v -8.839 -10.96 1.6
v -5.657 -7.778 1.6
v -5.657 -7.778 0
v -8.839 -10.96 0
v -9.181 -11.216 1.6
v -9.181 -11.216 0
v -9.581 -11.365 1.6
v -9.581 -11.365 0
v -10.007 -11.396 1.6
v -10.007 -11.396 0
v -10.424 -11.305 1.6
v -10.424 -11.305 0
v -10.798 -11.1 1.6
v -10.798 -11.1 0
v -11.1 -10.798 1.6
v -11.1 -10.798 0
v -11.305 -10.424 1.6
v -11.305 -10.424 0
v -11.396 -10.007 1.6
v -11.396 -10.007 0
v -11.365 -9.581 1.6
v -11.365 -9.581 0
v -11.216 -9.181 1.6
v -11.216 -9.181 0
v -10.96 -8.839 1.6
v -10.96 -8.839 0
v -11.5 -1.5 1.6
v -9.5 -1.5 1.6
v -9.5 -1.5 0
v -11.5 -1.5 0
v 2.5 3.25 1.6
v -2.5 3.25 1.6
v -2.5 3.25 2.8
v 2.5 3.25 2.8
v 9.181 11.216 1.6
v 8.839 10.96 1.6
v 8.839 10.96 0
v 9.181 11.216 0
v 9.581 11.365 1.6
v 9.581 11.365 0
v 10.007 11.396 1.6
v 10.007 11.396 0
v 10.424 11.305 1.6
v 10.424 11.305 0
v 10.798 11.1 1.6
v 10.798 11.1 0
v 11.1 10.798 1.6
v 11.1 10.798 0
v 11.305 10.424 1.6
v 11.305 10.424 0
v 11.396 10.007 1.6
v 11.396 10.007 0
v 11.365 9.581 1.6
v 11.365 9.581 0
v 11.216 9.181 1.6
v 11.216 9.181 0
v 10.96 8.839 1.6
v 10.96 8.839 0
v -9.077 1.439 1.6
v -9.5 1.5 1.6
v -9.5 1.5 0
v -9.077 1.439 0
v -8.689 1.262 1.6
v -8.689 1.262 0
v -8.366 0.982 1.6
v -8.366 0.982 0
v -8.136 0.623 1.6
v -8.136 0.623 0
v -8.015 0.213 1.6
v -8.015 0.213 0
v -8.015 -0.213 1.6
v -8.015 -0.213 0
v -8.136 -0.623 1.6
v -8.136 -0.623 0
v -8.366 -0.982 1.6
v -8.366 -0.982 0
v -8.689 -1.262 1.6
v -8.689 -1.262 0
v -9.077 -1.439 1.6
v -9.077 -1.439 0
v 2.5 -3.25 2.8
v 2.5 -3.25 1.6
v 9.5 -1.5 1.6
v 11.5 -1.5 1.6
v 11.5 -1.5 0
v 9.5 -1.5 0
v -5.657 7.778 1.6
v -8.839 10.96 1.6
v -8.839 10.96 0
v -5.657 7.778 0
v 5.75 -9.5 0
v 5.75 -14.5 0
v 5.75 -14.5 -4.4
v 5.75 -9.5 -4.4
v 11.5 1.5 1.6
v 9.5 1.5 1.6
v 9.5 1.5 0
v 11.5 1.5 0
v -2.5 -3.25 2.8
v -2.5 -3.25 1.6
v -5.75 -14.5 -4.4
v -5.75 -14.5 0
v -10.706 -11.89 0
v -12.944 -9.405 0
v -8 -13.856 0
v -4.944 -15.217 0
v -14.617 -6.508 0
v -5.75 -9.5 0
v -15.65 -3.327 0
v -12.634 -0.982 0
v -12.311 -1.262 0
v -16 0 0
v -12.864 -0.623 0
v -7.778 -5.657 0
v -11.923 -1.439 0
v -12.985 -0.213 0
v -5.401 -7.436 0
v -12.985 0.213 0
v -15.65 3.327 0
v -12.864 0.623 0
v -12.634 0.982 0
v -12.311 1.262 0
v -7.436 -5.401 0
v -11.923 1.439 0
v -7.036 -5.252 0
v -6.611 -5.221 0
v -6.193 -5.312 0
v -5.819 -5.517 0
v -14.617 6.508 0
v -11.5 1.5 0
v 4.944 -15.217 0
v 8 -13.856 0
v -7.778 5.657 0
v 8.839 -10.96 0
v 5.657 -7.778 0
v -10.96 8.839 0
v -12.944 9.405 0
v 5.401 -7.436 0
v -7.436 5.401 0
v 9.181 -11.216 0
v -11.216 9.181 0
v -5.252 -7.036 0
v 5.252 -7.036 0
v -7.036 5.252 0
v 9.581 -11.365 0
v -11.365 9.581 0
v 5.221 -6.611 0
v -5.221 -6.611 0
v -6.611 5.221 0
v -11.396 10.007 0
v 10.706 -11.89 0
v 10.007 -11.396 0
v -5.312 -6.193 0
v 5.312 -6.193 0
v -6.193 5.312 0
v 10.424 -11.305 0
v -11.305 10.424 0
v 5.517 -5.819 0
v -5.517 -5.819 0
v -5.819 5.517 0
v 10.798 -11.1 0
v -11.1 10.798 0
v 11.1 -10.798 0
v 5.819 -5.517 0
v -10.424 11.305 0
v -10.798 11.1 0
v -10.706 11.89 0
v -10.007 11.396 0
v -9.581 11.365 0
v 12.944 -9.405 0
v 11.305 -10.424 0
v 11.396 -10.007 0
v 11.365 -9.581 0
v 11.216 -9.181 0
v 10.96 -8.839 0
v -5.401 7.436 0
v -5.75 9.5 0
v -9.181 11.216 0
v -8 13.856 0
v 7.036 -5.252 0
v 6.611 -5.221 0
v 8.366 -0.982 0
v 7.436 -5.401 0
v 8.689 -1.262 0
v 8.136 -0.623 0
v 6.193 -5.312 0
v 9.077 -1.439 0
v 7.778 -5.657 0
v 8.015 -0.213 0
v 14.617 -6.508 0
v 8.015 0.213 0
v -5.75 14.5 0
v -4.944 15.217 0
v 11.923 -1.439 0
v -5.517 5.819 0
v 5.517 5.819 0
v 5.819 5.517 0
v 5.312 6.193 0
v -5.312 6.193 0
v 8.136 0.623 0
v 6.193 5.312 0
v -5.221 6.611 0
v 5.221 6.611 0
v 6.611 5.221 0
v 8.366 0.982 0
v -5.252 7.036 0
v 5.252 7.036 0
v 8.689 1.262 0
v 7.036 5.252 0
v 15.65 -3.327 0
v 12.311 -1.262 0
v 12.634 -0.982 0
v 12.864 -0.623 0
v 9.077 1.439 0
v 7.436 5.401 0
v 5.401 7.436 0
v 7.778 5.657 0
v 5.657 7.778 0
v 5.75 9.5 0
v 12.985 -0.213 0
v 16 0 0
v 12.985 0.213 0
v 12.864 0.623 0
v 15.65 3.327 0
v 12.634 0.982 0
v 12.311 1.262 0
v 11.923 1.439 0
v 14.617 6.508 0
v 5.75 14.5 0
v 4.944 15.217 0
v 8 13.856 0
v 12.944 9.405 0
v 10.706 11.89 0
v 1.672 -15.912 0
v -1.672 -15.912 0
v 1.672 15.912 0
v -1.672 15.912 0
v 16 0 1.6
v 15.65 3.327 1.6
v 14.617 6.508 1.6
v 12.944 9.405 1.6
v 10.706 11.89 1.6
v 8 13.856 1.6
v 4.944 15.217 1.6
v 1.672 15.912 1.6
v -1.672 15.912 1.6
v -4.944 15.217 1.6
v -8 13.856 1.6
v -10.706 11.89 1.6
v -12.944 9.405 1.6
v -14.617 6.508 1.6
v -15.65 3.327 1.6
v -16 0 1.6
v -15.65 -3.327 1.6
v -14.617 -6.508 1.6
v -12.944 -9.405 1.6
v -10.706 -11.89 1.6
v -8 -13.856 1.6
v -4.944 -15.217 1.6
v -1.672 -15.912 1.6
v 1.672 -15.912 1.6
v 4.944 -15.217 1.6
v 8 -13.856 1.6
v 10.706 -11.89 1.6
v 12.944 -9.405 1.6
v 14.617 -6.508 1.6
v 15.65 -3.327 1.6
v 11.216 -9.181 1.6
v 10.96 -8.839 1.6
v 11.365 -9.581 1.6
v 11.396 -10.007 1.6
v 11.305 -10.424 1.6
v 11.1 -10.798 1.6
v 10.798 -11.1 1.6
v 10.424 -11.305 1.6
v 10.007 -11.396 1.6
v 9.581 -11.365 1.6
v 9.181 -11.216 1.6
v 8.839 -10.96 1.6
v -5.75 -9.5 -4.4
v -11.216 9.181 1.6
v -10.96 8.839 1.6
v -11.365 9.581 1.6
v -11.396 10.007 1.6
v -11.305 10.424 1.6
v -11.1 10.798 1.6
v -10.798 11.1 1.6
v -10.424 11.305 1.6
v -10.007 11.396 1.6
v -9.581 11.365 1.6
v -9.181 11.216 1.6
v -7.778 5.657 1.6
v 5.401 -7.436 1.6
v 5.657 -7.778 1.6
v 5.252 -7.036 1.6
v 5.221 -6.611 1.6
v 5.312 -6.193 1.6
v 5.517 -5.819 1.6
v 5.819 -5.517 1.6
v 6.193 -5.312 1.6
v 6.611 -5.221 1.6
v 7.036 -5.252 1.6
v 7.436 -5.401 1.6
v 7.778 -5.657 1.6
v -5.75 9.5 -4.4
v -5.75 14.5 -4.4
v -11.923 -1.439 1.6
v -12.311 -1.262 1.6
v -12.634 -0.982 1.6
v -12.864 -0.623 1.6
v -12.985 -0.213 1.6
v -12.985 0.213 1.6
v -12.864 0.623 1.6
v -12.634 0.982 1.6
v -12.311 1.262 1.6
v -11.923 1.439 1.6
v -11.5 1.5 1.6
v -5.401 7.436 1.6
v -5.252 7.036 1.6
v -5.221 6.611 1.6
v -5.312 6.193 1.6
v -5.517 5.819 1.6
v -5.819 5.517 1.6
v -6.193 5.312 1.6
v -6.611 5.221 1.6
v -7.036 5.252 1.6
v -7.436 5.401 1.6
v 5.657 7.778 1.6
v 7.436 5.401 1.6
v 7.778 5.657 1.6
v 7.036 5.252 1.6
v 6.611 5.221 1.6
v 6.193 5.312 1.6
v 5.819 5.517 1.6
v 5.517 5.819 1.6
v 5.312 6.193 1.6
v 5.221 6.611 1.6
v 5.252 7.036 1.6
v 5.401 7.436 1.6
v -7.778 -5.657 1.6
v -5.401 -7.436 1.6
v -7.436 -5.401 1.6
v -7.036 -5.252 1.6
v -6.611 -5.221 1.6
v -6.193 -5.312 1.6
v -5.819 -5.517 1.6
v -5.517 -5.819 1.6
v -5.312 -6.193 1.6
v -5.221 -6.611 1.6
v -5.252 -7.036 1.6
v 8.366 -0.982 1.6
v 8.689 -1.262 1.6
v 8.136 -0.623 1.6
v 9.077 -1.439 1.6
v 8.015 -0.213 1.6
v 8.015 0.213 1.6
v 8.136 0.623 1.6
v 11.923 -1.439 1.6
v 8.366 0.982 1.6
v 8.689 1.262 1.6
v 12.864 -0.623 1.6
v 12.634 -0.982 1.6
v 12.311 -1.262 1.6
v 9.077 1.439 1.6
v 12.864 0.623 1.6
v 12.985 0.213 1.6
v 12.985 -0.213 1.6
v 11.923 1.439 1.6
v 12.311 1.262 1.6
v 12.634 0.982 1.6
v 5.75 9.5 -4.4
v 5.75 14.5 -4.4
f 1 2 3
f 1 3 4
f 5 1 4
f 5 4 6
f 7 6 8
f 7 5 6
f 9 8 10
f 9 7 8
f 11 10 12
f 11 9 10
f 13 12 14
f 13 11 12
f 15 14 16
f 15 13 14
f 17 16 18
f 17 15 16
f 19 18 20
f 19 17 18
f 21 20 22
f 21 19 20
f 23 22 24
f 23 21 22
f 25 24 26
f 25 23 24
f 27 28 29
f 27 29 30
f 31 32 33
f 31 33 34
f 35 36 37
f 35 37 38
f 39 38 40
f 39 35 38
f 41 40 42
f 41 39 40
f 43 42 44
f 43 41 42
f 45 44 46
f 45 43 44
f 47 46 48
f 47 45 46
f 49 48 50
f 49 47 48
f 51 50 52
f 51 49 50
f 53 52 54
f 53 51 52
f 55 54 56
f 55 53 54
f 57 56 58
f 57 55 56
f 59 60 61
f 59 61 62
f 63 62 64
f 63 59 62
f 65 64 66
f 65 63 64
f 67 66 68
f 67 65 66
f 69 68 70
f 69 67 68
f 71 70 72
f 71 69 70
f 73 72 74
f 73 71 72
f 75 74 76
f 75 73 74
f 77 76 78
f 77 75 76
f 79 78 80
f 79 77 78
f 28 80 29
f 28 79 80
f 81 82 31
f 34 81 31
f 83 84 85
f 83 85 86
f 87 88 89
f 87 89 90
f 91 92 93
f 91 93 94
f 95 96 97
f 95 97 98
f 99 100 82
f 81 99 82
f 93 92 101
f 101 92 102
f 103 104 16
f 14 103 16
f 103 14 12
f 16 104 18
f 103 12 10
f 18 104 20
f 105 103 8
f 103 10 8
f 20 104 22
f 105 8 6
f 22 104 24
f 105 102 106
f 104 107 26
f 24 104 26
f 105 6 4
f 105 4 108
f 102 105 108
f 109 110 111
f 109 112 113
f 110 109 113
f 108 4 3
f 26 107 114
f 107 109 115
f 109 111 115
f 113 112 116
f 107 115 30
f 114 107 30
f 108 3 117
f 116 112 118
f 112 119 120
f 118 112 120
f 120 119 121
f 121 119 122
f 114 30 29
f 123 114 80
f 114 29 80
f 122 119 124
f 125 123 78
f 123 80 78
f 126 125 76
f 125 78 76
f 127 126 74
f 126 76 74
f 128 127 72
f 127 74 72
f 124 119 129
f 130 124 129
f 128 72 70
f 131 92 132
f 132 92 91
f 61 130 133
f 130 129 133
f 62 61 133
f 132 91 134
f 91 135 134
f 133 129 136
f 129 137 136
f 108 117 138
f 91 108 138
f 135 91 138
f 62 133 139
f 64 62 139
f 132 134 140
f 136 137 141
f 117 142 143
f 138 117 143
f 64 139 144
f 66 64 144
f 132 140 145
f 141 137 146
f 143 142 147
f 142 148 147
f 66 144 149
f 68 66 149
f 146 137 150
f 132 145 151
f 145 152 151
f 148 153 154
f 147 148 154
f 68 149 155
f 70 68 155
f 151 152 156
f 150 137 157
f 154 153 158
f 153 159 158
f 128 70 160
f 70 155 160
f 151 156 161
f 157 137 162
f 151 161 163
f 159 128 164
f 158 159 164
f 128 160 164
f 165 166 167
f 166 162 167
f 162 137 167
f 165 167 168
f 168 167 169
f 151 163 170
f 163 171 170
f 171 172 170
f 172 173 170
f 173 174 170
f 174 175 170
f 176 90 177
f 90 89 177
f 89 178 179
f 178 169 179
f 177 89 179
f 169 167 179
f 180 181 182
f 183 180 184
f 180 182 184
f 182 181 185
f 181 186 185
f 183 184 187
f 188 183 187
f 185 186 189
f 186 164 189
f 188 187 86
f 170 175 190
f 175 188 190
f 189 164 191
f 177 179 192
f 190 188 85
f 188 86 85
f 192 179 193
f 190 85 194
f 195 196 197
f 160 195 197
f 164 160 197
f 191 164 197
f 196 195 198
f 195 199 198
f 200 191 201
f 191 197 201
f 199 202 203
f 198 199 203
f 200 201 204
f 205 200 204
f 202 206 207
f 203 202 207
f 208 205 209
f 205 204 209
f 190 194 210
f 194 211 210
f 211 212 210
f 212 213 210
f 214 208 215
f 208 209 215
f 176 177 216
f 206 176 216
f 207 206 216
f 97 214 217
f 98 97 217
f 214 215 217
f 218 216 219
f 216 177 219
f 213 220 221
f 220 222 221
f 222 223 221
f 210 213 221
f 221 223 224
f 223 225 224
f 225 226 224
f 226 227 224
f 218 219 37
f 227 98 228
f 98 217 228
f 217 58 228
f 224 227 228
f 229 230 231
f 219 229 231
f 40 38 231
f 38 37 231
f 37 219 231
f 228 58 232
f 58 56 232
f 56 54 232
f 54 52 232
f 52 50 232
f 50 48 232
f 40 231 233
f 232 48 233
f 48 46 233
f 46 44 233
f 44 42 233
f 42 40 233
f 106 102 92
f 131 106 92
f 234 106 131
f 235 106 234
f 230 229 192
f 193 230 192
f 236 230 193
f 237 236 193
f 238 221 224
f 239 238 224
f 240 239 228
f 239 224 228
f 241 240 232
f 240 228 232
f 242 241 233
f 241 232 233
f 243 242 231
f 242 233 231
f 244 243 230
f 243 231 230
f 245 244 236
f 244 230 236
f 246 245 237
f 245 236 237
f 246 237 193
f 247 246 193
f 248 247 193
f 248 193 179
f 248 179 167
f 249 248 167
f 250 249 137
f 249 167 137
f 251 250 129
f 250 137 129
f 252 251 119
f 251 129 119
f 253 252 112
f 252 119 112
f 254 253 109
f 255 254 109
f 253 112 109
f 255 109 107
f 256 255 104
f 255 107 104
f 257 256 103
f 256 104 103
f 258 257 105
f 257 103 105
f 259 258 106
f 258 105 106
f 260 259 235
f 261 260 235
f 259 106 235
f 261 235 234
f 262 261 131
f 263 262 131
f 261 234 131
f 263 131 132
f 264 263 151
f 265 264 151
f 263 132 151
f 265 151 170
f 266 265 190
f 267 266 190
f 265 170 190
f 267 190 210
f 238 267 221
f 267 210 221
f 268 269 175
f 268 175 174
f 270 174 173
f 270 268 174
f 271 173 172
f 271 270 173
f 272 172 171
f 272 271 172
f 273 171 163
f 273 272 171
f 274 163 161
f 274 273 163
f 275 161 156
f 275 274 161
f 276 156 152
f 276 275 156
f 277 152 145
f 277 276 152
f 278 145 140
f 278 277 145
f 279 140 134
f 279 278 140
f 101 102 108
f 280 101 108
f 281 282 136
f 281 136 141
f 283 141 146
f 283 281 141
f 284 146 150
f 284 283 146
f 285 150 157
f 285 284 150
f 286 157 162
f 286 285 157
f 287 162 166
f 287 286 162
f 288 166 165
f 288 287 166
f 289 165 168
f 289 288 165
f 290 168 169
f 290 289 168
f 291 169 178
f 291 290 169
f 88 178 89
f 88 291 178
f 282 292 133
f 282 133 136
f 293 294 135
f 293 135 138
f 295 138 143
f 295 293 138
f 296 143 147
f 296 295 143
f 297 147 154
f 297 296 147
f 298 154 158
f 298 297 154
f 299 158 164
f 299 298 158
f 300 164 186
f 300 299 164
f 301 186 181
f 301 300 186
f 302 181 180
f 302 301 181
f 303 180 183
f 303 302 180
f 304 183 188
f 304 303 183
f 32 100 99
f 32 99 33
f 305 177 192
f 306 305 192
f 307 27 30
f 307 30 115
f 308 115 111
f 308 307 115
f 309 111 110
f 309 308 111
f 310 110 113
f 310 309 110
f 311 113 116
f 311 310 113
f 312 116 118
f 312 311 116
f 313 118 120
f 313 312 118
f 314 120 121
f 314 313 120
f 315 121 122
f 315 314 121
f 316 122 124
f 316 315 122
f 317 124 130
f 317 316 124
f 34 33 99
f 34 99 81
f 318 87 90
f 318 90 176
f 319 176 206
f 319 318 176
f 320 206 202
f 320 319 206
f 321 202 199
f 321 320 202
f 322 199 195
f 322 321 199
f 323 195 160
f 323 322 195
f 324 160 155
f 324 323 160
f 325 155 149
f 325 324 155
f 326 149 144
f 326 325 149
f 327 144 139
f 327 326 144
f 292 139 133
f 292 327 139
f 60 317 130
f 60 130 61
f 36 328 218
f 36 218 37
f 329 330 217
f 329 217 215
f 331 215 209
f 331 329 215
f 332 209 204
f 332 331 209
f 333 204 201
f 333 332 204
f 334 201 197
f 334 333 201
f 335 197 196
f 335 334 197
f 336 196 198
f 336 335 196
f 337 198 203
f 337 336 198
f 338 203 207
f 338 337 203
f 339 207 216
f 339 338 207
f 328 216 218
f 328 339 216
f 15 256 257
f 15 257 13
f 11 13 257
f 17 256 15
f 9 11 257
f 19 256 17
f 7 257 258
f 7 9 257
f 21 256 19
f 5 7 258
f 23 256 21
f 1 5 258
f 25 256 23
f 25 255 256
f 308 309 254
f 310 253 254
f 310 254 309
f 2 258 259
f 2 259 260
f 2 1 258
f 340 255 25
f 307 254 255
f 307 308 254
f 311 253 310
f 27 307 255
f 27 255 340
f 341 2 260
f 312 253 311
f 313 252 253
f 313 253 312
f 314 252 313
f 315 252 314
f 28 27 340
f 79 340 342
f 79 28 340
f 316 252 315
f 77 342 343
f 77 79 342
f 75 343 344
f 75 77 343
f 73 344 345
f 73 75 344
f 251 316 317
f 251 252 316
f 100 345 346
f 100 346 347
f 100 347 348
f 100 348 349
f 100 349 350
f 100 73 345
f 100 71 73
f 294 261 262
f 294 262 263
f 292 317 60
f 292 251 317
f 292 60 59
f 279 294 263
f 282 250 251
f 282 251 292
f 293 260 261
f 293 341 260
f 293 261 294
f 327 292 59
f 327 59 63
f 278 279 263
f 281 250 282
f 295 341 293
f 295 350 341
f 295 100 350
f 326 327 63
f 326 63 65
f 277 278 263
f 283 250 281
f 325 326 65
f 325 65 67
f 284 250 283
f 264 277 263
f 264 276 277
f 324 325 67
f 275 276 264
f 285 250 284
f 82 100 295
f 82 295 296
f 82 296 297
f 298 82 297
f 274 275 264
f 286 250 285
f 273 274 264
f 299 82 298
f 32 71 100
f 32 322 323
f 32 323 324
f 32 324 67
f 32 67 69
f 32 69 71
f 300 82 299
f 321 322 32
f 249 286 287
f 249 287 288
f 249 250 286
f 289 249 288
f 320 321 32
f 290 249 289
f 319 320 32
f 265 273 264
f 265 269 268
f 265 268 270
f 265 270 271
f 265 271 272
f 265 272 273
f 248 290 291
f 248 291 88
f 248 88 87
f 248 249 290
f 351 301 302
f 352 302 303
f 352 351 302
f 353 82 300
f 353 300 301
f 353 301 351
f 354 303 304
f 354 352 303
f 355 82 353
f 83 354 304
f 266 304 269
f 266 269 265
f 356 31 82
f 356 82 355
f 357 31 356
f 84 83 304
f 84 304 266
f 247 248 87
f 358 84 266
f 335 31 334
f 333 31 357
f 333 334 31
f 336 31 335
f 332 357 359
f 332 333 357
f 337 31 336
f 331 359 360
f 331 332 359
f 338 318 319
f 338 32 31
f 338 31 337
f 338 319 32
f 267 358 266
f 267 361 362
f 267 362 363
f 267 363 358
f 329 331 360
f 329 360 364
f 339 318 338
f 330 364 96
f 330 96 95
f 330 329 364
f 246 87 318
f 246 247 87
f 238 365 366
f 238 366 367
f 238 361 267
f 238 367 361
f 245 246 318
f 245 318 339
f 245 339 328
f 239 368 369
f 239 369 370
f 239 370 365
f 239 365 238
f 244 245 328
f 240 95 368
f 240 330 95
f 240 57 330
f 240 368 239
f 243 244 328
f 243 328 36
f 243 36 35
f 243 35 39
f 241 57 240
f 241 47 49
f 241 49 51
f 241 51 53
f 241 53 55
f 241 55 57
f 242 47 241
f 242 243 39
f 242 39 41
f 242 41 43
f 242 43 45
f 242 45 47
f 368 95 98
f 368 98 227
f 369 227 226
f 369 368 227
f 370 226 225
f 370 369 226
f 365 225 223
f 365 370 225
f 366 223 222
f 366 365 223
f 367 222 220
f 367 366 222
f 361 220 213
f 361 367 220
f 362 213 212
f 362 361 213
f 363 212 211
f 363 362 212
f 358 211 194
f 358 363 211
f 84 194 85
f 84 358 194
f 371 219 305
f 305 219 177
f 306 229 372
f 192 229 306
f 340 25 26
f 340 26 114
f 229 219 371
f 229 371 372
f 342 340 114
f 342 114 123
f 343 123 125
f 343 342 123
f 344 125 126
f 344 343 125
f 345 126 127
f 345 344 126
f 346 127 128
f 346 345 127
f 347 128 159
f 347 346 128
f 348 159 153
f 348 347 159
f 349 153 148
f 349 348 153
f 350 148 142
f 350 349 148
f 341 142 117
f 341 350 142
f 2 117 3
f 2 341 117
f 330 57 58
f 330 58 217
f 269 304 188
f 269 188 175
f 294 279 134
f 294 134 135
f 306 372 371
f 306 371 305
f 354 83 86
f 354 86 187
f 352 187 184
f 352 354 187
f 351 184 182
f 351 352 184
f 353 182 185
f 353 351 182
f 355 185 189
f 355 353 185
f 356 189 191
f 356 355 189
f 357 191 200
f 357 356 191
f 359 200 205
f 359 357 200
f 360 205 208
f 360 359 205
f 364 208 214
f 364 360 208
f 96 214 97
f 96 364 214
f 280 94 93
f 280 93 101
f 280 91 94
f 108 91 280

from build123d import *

# Parameters (mm, degrees)
SKETCH1_R           = 16
BOSS_EXTRUDE1_DEPTH = 1.6
SKETCH2_W           = 5
SKETCH2_H           = 6.5
BOSS_EXTRUDE2_DEPTH = 1.2
CUT_EXTRUDE1_DEPTH  = 23.683915006
SKETCH4_W           = 11.5
SKETCH4_H           = 5
BOSS_EXTRUDE3_DEPTH = 4.4


with BuildPart() as part:
    # Sketch1 → Boss-Extrude1 (new body)
    with BuildSketch(Plane.XY):
        Circle(SKETCH1_R)
    extrude(amount=BOSS_EXTRUDE1_DEPTH)

    # Sketch2 → Boss-Extrude2 (add)
    with BuildSketch(Plane.XY.offset(1.6)):
        Rectangle(SKETCH2_W, SKETCH2_H)
    extrude(amount=BOSS_EXTRUDE2_DEPTH)

    # Sketch3 → Cut-Extrude1 (cut, through all)
    with BuildSketch(Plane.XY.offset(1.6)):
        with BuildLine():
            Line((-5.656854249, -7.778174593), (-8.838834765, -10.960155108))
            ThreePointArc((-8.838834765, -10.960155108), (-10.960155108, -10.960155108), (-10.960155108, -8.838834765))
            Line((-10.960155108, -8.838834765), (-7.778174593, -5.656854249))
            ThreePointArc((-7.778174593, -5.656854249), (-5.656854249, -5.656854249), (-5.656854249, -7.778174593))
        make_face()
        with BuildLine():
            Line((-9.5, -1.5), (-11.5, -1.5))
            ThreePointArc((-11.5, -1.5), (-13, 0), (-11.5, 1.5))
            Line((-11.5, 1.5), (-9.5, 1.5))
            ThreePointArc((-9.5, 1.5), (-8, 0), (-9.5, -1.5))
        make_face()
        with BuildLine():
            Line((-7.778174593, 5.656854249), (-10.960155108, 8.838834765))
            ThreePointArc((-10.960155108, 8.838834765), (-10.960155108, 10.960155108), (-8.838834765, 10.960155108))
            Line((-8.838834765, 10.960155108), (-5.656854249, 7.778174593))
            ThreePointArc((-5.656854249, 7.778174593), (-5.656854249, 5.656854249), (-7.778174593, 5.656854249))
        make_face()
        with BuildLine():
            Line((5.656854249, 7.778174593), (8.838834765, 10.960155108))
            ThreePointArc((8.838834765, 10.960155108), (10.960155108, 10.960155108), (10.960155108, 8.838834765))
            Line((10.960155108, 8.838834765), (7.778174593, 5.656854249))
            ThreePointArc((7.778174593, 5.656854249), (5.656854249, 5.656854249), (5.656854249, 7.778174593))
        make_face()
        with BuildLine():
            Line((7.778174593, -5.656854249), (10.960155108, -8.838834765))
            ThreePointArc((10.960155108, -8.838834765), (10.960155108, -10.960155108), (8.838834765, -10.960155108))
            Line((8.838834765, -10.960155108), (5.656854249, -7.778174593))
            ThreePointArc((5.656854249, -7.778174593), (5.656854249, -5.656854249), (7.778174593, -5.656854249))
        make_face()
        with BuildLine():
            Line((9.5, 1.5), (11.5, 1.5))
            ThreePointArc((11.5, 1.5), (13, 0), (11.5, -1.5))
            Line((11.5, -1.5), (9.5, -1.5))
            ThreePointArc((9.5, -1.5), (8, 0), (9.5, 1.5))
        make_face()
    extrude(amount=-CUT_EXTRUDE1_DEPTH, mode=Mode.SUBTRACT)

    # Sketch4 → Boss-Extrude3 (add)
    with BuildSketch(Plane(origin=(0, 0, 0), x_dir=(-1, 0, 0), z_dir=(0, 0, -1))):
        with Locations((0, 12)):
            Rectangle(SKETCH4_W, SKETCH4_H)
        with Locations((0, -12)):
            Rectangle(SKETCH4_W, SKETCH4_H)
    extrude(amount=BOSS_EXTRUDE3_DEPTH)


solid = part.part
